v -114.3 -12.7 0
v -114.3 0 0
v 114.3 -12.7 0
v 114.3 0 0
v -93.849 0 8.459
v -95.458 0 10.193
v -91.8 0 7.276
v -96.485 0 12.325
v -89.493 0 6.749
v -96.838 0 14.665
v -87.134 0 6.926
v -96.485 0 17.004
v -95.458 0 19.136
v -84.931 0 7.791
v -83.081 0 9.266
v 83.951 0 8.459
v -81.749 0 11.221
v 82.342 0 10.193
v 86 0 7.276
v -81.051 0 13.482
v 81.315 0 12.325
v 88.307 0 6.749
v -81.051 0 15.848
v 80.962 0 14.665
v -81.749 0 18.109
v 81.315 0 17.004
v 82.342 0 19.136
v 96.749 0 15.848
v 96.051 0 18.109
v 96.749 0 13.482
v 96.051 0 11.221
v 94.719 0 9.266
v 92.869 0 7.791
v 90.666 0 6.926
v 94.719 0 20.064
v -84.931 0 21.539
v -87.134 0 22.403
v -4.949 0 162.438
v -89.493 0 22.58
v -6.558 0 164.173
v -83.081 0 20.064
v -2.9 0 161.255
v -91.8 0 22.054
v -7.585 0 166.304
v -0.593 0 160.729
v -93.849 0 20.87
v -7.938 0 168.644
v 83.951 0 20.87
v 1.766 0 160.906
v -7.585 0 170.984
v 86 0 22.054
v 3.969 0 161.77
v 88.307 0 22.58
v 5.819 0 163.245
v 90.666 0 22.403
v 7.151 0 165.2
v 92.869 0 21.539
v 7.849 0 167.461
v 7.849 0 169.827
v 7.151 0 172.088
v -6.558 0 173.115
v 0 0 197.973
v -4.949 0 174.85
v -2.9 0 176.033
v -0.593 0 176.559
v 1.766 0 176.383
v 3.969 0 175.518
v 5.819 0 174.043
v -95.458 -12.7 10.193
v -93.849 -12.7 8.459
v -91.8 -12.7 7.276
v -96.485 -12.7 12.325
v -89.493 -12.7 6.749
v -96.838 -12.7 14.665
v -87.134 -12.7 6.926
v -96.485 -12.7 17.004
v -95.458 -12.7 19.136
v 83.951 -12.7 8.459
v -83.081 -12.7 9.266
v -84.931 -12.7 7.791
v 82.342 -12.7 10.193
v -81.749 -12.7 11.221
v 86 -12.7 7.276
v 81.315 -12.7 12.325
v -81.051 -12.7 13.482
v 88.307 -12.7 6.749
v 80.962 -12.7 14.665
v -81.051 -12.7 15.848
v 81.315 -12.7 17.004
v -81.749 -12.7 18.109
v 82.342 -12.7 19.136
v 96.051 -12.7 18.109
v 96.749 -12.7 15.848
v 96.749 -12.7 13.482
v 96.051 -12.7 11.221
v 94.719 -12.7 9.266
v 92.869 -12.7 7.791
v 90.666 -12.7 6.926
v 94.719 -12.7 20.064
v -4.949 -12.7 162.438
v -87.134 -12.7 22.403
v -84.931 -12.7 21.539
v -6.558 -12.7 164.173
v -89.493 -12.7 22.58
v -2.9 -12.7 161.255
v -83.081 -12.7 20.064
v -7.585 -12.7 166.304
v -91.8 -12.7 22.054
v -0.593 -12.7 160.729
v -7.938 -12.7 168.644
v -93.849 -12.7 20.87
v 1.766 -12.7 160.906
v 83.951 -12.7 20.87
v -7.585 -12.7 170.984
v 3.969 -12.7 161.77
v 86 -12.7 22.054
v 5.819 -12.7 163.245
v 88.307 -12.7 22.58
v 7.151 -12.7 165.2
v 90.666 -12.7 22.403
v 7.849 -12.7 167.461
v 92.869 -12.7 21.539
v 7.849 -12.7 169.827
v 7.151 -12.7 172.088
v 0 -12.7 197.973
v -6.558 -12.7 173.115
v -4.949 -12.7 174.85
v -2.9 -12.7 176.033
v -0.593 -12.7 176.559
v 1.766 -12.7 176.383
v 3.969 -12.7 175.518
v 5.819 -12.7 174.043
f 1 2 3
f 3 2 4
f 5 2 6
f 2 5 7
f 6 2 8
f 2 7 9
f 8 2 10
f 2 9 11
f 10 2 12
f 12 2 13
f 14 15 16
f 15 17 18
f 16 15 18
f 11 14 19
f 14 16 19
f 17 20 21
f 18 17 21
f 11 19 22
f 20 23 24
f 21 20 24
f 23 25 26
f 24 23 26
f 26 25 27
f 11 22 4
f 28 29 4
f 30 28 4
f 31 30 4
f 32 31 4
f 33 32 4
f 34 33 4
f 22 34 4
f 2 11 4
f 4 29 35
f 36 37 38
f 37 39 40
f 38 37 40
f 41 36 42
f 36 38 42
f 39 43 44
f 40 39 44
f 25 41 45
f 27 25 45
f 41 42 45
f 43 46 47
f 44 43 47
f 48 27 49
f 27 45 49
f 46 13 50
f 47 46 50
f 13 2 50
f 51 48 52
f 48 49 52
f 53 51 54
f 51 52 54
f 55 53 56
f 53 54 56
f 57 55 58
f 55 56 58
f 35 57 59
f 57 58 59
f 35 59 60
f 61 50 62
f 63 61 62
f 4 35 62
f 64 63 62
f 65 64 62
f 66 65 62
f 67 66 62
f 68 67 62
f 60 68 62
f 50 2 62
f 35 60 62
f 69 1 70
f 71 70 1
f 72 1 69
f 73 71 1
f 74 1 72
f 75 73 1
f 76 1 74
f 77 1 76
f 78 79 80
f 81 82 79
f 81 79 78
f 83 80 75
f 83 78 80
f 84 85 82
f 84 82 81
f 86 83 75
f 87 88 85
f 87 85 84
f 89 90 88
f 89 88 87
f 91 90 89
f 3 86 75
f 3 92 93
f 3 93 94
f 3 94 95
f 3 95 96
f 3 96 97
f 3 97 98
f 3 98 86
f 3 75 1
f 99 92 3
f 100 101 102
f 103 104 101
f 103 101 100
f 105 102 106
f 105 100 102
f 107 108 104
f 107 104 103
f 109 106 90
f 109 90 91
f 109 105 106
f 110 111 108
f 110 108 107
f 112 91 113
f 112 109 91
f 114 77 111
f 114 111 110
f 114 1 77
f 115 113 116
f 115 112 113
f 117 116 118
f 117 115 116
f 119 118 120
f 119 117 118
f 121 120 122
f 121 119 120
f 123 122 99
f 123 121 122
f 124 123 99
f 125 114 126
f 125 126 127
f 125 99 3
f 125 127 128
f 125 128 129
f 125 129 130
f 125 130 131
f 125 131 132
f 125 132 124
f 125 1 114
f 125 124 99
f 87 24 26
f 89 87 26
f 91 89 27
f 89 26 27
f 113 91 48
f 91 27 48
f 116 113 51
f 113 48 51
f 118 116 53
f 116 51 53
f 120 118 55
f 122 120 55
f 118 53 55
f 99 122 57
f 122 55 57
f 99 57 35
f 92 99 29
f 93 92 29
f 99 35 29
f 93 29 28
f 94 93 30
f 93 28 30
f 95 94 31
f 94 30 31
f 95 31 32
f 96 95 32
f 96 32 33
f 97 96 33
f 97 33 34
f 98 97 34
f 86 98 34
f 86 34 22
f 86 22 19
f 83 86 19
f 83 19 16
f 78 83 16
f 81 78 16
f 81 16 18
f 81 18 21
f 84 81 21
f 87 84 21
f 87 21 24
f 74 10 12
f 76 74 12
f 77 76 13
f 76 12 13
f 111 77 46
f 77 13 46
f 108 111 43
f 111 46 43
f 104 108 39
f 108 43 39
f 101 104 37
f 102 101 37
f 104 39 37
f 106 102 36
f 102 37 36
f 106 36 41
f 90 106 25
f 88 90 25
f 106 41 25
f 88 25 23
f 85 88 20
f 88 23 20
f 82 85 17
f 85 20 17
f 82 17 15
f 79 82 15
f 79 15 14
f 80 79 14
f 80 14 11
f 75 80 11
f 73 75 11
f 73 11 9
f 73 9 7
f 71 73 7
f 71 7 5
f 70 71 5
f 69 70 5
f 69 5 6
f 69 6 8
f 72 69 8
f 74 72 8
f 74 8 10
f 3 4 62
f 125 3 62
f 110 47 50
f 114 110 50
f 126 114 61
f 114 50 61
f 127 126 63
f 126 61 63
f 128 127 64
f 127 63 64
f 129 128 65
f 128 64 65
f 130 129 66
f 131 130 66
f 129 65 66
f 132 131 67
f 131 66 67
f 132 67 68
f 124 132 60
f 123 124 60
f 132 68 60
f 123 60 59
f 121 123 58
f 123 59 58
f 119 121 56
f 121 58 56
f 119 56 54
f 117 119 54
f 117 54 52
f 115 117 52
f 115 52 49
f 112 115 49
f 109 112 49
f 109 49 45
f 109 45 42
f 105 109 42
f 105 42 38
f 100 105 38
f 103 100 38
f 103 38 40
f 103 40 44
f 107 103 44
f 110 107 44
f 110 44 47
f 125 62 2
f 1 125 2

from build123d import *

# Parameters (mm, degrees)
F1_DEPTH = 12.7
F3_D     = 15.875


# Not quite as in the source:
# - a length typed as a fraction of an inch, garbled in the dataset ("3 / 203.2 mm" for 3/8 in), is restored


with BuildPart() as f1:
    # F0 (on Front) → F1 (new body)
    with BuildSketch(Plane.XZ):
        Polygon((114.3, 0), (0, 197.9734073051), (-114.3, 0), align=None)
    extrude(amount=F1_DEPTH)

    # F3 (through all)
    with Locations(Plane.XZ.offset(12.7)):
        with Locations((0, 168.6440136303), (-88.9, 14.6646968374), (88.9, 14.6646968374)):
            Hole(F3_D / 2)


solid = f1.part
